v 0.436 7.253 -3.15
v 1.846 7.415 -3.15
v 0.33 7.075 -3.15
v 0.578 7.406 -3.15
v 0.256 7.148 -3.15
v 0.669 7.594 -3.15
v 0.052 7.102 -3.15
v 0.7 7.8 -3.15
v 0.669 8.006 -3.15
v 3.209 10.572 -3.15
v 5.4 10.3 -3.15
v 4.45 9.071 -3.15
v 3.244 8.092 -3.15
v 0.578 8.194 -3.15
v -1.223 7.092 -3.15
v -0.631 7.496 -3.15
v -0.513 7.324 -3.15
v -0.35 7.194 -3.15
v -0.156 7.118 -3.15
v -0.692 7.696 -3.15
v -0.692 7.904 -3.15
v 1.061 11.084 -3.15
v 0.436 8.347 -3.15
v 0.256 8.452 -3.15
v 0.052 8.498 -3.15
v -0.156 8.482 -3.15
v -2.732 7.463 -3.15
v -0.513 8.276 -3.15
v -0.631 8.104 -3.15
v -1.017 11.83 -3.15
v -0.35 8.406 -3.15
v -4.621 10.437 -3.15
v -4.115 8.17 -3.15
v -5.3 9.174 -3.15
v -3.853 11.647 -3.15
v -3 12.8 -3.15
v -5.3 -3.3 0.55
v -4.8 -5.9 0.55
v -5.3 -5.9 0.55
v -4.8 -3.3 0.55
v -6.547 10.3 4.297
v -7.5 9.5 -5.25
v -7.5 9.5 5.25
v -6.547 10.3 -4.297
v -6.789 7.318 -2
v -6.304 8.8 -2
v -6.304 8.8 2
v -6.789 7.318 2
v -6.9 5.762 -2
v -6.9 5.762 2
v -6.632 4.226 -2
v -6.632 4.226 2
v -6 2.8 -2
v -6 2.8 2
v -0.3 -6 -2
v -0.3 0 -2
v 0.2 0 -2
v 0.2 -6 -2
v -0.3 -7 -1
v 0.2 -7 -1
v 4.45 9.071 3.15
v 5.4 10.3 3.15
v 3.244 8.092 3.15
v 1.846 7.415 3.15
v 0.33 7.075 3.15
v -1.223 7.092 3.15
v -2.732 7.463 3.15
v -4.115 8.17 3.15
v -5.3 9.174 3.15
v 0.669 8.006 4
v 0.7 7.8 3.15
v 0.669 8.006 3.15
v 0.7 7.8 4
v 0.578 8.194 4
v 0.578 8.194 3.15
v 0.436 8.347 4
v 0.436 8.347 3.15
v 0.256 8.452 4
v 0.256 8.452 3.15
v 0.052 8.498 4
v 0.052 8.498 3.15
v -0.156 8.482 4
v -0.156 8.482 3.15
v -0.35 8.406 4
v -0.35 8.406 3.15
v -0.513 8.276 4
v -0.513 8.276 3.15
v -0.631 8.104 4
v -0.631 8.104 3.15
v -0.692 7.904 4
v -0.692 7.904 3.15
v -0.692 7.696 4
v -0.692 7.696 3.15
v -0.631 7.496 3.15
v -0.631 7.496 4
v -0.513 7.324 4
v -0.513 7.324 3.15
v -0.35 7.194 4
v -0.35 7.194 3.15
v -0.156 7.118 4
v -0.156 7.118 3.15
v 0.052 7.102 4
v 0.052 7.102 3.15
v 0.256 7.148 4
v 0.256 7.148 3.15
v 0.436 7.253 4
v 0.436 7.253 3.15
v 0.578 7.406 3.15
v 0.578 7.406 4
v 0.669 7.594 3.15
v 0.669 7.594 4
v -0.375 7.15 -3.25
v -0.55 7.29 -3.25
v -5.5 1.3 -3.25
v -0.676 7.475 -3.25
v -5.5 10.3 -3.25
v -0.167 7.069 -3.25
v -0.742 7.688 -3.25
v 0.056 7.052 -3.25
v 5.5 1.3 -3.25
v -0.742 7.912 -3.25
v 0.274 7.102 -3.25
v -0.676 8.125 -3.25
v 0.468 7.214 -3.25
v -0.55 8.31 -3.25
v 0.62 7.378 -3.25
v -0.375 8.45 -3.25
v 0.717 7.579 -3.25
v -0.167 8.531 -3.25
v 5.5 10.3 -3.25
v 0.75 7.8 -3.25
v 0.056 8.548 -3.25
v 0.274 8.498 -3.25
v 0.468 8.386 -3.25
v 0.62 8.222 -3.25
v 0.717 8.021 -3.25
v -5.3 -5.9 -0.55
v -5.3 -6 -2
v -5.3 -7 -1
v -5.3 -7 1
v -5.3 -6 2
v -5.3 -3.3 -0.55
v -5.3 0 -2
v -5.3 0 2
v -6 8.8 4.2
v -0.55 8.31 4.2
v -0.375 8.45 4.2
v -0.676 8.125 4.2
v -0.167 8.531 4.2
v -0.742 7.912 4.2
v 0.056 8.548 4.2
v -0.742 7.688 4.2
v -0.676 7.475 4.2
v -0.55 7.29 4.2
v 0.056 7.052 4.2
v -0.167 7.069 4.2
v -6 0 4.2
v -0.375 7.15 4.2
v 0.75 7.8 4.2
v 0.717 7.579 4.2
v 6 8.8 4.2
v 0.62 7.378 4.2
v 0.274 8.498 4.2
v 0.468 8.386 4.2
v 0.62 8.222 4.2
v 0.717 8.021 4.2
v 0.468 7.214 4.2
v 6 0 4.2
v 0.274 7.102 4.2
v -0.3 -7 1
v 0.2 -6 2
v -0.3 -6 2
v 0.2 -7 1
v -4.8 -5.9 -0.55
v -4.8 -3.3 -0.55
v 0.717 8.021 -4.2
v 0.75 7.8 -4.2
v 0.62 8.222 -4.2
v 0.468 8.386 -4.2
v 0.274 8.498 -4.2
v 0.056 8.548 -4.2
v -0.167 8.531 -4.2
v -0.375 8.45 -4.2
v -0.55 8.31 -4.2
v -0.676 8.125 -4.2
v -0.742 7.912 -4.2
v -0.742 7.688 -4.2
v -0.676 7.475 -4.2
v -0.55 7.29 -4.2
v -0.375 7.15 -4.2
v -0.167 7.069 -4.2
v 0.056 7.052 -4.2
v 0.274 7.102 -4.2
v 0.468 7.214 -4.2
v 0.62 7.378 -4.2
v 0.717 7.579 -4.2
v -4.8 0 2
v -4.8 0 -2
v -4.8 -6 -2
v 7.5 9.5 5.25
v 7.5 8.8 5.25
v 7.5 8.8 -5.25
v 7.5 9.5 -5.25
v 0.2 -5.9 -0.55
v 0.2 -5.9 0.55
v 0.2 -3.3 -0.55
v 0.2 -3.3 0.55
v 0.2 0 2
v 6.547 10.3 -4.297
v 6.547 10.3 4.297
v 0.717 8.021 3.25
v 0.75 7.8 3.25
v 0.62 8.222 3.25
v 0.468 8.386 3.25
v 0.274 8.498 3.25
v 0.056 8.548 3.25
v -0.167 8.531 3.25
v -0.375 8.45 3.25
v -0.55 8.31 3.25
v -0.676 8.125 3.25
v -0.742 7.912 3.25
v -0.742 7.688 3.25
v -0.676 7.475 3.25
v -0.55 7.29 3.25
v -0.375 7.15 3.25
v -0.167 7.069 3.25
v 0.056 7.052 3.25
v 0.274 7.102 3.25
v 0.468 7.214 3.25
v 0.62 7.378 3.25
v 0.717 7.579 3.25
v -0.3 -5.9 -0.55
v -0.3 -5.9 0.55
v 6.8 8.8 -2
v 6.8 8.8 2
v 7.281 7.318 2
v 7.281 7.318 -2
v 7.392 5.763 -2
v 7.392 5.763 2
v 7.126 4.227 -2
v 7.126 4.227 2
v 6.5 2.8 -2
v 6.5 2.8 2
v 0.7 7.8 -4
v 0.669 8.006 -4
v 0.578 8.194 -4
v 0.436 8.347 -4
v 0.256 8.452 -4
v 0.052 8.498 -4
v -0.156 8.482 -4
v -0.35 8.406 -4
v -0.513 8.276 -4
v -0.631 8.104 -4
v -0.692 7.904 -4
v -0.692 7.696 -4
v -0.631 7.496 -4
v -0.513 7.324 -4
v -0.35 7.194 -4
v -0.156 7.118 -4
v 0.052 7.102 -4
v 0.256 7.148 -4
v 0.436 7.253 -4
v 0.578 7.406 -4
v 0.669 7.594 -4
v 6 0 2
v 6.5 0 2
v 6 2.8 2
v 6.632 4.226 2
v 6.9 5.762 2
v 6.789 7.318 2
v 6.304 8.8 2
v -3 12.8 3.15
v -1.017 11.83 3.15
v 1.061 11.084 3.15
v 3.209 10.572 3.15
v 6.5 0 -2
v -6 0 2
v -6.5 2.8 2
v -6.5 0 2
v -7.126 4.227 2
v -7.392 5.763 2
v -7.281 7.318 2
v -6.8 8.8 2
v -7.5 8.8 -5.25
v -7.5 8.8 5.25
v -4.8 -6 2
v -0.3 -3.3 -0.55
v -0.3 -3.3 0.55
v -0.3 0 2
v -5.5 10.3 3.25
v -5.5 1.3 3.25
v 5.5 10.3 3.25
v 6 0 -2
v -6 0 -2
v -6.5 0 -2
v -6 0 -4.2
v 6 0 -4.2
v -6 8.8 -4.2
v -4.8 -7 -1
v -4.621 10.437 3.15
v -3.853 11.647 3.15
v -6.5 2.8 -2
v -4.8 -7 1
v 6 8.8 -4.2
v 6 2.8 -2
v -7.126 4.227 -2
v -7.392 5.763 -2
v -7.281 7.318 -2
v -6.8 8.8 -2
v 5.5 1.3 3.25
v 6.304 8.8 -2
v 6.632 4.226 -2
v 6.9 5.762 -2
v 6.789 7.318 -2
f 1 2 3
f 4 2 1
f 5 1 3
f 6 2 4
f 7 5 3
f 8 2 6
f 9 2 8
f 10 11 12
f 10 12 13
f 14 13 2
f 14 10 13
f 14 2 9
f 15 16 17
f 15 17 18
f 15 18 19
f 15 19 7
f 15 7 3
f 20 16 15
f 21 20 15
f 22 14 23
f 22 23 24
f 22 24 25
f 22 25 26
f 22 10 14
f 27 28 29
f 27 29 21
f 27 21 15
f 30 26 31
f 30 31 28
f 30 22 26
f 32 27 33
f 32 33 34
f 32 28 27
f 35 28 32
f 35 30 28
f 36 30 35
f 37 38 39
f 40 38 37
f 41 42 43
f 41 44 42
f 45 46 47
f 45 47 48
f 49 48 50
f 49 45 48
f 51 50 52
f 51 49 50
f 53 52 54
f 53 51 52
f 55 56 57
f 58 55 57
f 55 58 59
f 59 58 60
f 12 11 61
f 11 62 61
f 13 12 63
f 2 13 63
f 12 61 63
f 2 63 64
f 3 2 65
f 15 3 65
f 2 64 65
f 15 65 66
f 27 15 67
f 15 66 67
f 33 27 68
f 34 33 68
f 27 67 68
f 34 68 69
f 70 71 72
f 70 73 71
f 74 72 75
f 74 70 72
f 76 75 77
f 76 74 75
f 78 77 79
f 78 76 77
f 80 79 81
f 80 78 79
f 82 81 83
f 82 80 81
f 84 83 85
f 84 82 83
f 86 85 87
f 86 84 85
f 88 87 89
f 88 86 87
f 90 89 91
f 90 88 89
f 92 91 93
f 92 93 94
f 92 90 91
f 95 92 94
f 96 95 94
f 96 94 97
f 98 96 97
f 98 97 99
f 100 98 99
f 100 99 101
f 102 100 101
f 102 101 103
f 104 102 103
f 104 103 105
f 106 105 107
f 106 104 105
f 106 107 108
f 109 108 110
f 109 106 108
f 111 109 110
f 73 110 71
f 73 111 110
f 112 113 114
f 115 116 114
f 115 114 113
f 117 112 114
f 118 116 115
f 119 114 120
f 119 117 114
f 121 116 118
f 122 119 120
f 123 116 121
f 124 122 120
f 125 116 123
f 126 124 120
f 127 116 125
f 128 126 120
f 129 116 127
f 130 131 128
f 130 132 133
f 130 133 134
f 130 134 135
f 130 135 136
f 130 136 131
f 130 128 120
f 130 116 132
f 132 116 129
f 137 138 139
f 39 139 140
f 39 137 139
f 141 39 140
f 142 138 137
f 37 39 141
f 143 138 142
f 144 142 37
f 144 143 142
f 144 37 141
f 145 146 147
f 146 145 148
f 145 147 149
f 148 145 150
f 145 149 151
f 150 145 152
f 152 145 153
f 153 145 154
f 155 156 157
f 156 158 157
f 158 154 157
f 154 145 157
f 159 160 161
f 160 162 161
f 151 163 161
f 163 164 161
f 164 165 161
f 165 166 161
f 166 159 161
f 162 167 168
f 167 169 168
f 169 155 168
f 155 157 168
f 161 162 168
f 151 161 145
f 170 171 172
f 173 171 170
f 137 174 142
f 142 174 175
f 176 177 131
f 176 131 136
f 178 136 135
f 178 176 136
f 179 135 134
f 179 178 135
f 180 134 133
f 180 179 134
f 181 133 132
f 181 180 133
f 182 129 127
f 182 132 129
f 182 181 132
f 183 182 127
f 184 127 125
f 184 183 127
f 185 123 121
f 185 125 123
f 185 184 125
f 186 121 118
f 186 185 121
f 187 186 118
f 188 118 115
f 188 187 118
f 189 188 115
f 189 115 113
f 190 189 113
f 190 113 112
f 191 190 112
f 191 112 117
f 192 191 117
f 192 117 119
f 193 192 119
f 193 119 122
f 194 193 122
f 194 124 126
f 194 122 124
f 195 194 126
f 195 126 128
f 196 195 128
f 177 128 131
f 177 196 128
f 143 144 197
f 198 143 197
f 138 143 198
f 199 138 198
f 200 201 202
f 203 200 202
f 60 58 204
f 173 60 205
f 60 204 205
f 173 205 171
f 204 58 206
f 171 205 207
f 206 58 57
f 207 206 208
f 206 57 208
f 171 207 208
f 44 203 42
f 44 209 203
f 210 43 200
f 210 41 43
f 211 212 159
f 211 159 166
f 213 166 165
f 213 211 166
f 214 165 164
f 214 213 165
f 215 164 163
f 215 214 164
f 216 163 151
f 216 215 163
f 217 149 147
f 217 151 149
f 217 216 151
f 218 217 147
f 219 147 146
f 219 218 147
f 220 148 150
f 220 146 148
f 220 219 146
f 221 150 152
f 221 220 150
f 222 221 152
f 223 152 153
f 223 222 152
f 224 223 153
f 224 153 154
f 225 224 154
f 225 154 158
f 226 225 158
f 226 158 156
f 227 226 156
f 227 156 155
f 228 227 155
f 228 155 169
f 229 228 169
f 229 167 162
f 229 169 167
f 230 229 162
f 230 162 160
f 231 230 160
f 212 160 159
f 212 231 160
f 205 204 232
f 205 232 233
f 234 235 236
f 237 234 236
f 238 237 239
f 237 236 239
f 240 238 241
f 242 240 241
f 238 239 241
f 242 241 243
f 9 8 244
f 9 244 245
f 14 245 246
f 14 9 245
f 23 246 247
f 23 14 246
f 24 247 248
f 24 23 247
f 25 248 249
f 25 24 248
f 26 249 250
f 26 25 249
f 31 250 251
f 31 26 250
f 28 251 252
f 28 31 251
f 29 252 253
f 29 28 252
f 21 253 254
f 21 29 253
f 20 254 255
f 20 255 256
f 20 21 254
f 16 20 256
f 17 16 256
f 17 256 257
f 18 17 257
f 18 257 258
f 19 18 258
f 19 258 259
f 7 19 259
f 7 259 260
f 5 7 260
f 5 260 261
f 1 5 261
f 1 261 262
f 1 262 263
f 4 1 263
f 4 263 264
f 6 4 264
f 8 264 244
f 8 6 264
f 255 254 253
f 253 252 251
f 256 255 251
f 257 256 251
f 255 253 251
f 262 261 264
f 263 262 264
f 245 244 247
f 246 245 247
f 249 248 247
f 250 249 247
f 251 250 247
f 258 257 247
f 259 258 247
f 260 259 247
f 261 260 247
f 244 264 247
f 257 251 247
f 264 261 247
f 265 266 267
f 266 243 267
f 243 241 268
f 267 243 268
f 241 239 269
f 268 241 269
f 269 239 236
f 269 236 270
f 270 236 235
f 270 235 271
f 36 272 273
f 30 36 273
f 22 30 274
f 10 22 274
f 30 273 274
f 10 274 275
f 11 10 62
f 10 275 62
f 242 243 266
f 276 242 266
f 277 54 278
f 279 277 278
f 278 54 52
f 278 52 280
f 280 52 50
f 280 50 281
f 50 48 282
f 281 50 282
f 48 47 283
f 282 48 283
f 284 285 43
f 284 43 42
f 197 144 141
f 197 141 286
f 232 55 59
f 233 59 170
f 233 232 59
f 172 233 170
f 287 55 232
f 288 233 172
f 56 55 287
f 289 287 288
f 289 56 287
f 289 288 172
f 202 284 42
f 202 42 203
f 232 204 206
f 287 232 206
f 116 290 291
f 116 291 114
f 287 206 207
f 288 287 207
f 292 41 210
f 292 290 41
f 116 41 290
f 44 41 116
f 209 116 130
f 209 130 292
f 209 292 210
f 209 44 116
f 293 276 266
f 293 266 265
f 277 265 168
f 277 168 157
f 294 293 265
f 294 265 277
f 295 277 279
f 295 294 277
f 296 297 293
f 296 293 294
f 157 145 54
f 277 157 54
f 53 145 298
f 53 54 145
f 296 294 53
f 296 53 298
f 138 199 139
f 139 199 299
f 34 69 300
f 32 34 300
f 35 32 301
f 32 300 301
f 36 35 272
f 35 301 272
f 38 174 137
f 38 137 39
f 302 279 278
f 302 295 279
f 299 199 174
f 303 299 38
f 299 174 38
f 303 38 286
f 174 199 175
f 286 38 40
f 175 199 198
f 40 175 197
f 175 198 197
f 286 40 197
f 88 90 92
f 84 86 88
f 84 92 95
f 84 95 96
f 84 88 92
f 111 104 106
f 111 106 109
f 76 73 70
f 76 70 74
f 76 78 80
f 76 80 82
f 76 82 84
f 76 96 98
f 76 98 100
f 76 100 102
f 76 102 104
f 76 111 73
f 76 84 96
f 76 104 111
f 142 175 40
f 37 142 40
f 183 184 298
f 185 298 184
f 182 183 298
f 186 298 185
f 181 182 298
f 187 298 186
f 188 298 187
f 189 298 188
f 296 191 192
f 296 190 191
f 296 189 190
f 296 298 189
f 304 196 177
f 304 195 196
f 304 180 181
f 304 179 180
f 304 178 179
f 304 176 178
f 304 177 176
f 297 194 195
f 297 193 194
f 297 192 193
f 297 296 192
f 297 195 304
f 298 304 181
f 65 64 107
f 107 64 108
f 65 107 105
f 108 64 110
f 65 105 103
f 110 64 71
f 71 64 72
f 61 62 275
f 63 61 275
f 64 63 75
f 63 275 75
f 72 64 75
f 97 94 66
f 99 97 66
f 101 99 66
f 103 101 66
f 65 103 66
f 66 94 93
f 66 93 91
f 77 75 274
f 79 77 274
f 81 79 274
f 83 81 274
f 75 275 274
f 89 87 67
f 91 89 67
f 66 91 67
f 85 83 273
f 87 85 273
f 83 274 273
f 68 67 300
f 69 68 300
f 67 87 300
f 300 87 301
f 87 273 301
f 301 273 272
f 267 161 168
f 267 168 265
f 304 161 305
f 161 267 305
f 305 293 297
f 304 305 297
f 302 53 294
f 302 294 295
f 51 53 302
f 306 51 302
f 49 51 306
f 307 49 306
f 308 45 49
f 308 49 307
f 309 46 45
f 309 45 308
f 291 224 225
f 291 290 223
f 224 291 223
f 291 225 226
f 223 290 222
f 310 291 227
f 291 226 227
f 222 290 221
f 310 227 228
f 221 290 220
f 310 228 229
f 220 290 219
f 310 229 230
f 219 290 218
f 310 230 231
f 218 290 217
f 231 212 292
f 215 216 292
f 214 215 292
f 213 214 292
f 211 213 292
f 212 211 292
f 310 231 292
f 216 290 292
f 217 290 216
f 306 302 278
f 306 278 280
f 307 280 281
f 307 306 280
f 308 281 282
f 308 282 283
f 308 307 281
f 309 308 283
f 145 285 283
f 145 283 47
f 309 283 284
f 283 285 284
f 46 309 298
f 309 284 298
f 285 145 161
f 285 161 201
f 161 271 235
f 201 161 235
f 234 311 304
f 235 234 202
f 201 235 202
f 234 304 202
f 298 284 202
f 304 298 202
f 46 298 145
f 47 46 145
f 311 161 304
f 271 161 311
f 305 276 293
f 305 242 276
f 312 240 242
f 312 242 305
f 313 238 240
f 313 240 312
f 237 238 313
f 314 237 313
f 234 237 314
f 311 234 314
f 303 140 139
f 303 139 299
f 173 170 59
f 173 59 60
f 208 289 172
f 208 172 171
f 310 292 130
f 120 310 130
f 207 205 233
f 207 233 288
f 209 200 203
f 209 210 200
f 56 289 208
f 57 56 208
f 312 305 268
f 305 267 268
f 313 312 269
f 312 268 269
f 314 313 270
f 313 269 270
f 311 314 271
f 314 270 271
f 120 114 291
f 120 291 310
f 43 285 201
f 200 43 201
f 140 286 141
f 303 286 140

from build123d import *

# Parameters (mm, degrees)
CROQUIS1_W                 = 12
CROQUIS1_H                 = 8.4
SALIENTE_EXTRUIR1_DEPTH    = 8.8
CROQUIS2_W                 = 15
CROQUIS2_H                 = 10.5
SALIENTE_EXTRUIR2_DEPTH    = 0.7
CROQUIS3_W                 = 15
CROQUIS3_H                 = 10.5
SALIENTE_EXTRUIR3_DEPTH    = 0.8
SALIENTE_EXTRUIR3_TAPER    = 50
CROQUIS4_W                 = 11
CROQUIS4_H                 = 6.5
CORTAR_EXTRUIR1_DEPTH      = 9
CORTAR_EXTRUIR7_DEPTH      = 14.780511769
CORTAR_EXTRUIR7_DEPTH_BACK = 14.780511769
CROQUIS6_R                 = 0.75
SALIENTE_EXTRUIR4_DEPTH    = 3.15
CROQUIS7_R                 = 0.7
SALIENTE_EXTRUIR5_DEPTH    = 4
SALIENTE_EXTRUIR6_DEPTH    = 2
CROQUIS9_W                 = 0.5
CROQUIS9_H                 = 4
SALIENTE_EXTRUIR7_DEPTH    = 7
SALIENTE_EXTRUIR7_2_DEPTH  = 7
CORTAR_EXTRUIR8_DEPTH      = 19.84787796
CORTAR_EXTRUIR8_DEPTH_BACK = 19.84787796
CROQUIS10_W                = 1.1
CROQUIS10_H                = 2.6


with BuildPart() as part:
    # Croquis1 → Saliente-Extruir1 (new body)
    with BuildSketch(Plane(origin=(0, 0, 0), x_dir=(1, 0, 0), z_dir=(0, 1, 0))):
        Rectangle(CROQUIS1_W, CROQUIS1_H)
    extrude(amount=SALIENTE_EXTRUIR1_DEPTH)

    # Croquis2 → Saliente-Extruir2 (add)
    with BuildSketch(Plane(origin=(0, 8.8, 0), x_dir=(1, 0, 0), z_dir=(0, 1, 0))):
        Rectangle(CROQUIS2_W, CROQUIS2_H)
    extrude(amount=SALIENTE_EXTRUIR2_DEPTH)

    # Croquis3 → Saliente-Extruir3 (add)
    with BuildSketch(Plane(origin=(0, 9.5, 0), x_dir=(1, 0, 0), z_dir=(0, 1, 0))):
        Rectangle(CROQUIS3_W, CROQUIS3_H)
    extrude(amount=SALIENTE_EXTRUIR3_DEPTH, taper=SALIENTE_EXTRUIR3_TAPER)

    # Croquis4 → Cortar-Extruir1 (cut)
    with BuildSketch(Plane(origin=(0, 10.3, 0), x_dir=(1, 0, 0), z_dir=(0, 1, 0))):
        Rectangle(CROQUIS4_W, CROQUIS4_H)
    extrude(amount=-CORTAR_EXTRUIR1_DEPTH, mode=Mode.SUBTRACT)

    # Croquis6 → Cortar-Extruir7 (cut, two sides: drawn at the far end of the back side and taken through both)
    with BuildSketch(Plane.XY.offset(-CORTAR_EXTRUIR7_DEPTH_BACK)):
        with Locations((0, 7.8)):
            Circle(CROQUIS6_R)
    extrude(amount=CORTAR_EXTRUIR7_DEPTH + CORTAR_EXTRUIR7_DEPTH_BACK, mode=Mode.SUBTRACT)

    # Croquis8 → Saliente-Extruir6 (add, symmetric)
    with BuildSketch(Plane.XY):
        with BuildLine():
            Line((-6.5, 0), (-6.5, 2.8))
            ThreePointArc((-6.5, 2.8), (-7.391960026, 5.762901999), (-6.8, 8.8))
            Line((-6.8, 8.8), (-6.304155921, 8.8))
            ThreePointArc((-6.304155921, 8.8), (-6.9, 5.762085847), (-6, 2.8))
            Line((-6, 2.8), (-6, 0))
            Line((-6, 0), (-6.5, 0))
        make_face()
        with BuildLine():
            Line((6.5, 0), (6, 0))
            Line((6, 0), (6, 2.8))
            ThreePointArc((6, 2.8), (6.9, 5.762085847), (6.304155921, 8.8))
            Line((6.304155921, 8.8), (6.8, 8.8))
            ThreePointArc((6.8, 8.8), (7.391960026, 5.762901999), (6.5, 2.8))
            Line((6.5, 2.8), (6.5, 0))
        make_face()
    extrude(amount=SALIENTE_EXTRUIR6_DEPTH, both=True)


with BuildPart() as body_2:
    # Croquis5 → Saliente-Extruir4 (new, symmetric)
    with BuildSketch(Plane.XY):
        with BuildLine():
            ThreePointArc((-3, 12.8), (1.061376284, 11.084224314), (5.4, 10.3))
            ThreePointArc((5.4, 10.3), (0.330087699, 7.07524599), (-5.3, 9.174093689))
            ThreePointArc((-5.3, 9.174093689), (-4.24758894, 11.048949867), (-3, 12.8))
        make_face()
    extrude(amount=SALIENTE_EXTRUIR4_DEPTH, both=True)

    # Croquis7 → Saliente-Extruir5 (add, symmetric)
    with BuildSketch(Plane.XY):
        with Locations((0, 7.8)):
            Circle(CROQUIS7_R)
    extrude(amount=SALIENTE_EXTRUIR5_DEPTH, both=True)


with BuildPart() as body_3:
    # Croquis9 → Saliente-Extruir7 (new body)
    with BuildSketch(Plane.XZ):
        with Locations((-5.05, 0)):
            Rectangle(CROQUIS9_W, CROQUIS9_H)
    extrude(amount=SALIENTE_EXTRUIR7_DEPTH)


with BuildPart() as body_4:
    # Croquis9 → Saliente-Extruir7 2 (new body)
    with BuildSketch(Plane.XZ):
        with Locations((-0.05, 0)):
            Rectangle(CROQUIS9_W, CROQUIS9_H)
    extrude(amount=SALIENTE_EXTRUIR7_2_DEPTH)


with BuildPart() as cortar_extruir8_tool:
    # Croquis10 → Cortar-Extruir8 (new, two sides: drawn at the far end of the back side and taken through both)
    with BuildSketch(Plane.ZY.offset(5.3).offset(-CORTAR_EXTRUIR8_DEPTH_BACK)):
        with Locations((0, -4.6)):
            Rectangle(CROQUIS10_W, CROQUIS10_H)
        Polygon((-2, -6), (-1, -7), (-2, -7), align=None)
        Polygon((2, -6), (1, -7), (2, -7), align=None)
    extrude(amount=CORTAR_EXTRUIR8_DEPTH + CORTAR_EXTRUIR8_DEPTH_BACK)


with BuildPart() as body_3_1:
    add(body_3.part)

    # Cortar-Extruir8: cut by cortar_extruir8_tool
    add(cortar_extruir8_tool.part, mode=Mode.SUBTRACT)


with BuildPart() as body_4_1:
    add(body_4.part)

    # Cortar-Extruir8: cut by cortar_extruir8_tool
    add(cortar_extruir8_tool.part, mode=Mode.SUBTRACT)


solid = Compound([part.part, body_2.part, body_3_1.part, body_4_1.part])
